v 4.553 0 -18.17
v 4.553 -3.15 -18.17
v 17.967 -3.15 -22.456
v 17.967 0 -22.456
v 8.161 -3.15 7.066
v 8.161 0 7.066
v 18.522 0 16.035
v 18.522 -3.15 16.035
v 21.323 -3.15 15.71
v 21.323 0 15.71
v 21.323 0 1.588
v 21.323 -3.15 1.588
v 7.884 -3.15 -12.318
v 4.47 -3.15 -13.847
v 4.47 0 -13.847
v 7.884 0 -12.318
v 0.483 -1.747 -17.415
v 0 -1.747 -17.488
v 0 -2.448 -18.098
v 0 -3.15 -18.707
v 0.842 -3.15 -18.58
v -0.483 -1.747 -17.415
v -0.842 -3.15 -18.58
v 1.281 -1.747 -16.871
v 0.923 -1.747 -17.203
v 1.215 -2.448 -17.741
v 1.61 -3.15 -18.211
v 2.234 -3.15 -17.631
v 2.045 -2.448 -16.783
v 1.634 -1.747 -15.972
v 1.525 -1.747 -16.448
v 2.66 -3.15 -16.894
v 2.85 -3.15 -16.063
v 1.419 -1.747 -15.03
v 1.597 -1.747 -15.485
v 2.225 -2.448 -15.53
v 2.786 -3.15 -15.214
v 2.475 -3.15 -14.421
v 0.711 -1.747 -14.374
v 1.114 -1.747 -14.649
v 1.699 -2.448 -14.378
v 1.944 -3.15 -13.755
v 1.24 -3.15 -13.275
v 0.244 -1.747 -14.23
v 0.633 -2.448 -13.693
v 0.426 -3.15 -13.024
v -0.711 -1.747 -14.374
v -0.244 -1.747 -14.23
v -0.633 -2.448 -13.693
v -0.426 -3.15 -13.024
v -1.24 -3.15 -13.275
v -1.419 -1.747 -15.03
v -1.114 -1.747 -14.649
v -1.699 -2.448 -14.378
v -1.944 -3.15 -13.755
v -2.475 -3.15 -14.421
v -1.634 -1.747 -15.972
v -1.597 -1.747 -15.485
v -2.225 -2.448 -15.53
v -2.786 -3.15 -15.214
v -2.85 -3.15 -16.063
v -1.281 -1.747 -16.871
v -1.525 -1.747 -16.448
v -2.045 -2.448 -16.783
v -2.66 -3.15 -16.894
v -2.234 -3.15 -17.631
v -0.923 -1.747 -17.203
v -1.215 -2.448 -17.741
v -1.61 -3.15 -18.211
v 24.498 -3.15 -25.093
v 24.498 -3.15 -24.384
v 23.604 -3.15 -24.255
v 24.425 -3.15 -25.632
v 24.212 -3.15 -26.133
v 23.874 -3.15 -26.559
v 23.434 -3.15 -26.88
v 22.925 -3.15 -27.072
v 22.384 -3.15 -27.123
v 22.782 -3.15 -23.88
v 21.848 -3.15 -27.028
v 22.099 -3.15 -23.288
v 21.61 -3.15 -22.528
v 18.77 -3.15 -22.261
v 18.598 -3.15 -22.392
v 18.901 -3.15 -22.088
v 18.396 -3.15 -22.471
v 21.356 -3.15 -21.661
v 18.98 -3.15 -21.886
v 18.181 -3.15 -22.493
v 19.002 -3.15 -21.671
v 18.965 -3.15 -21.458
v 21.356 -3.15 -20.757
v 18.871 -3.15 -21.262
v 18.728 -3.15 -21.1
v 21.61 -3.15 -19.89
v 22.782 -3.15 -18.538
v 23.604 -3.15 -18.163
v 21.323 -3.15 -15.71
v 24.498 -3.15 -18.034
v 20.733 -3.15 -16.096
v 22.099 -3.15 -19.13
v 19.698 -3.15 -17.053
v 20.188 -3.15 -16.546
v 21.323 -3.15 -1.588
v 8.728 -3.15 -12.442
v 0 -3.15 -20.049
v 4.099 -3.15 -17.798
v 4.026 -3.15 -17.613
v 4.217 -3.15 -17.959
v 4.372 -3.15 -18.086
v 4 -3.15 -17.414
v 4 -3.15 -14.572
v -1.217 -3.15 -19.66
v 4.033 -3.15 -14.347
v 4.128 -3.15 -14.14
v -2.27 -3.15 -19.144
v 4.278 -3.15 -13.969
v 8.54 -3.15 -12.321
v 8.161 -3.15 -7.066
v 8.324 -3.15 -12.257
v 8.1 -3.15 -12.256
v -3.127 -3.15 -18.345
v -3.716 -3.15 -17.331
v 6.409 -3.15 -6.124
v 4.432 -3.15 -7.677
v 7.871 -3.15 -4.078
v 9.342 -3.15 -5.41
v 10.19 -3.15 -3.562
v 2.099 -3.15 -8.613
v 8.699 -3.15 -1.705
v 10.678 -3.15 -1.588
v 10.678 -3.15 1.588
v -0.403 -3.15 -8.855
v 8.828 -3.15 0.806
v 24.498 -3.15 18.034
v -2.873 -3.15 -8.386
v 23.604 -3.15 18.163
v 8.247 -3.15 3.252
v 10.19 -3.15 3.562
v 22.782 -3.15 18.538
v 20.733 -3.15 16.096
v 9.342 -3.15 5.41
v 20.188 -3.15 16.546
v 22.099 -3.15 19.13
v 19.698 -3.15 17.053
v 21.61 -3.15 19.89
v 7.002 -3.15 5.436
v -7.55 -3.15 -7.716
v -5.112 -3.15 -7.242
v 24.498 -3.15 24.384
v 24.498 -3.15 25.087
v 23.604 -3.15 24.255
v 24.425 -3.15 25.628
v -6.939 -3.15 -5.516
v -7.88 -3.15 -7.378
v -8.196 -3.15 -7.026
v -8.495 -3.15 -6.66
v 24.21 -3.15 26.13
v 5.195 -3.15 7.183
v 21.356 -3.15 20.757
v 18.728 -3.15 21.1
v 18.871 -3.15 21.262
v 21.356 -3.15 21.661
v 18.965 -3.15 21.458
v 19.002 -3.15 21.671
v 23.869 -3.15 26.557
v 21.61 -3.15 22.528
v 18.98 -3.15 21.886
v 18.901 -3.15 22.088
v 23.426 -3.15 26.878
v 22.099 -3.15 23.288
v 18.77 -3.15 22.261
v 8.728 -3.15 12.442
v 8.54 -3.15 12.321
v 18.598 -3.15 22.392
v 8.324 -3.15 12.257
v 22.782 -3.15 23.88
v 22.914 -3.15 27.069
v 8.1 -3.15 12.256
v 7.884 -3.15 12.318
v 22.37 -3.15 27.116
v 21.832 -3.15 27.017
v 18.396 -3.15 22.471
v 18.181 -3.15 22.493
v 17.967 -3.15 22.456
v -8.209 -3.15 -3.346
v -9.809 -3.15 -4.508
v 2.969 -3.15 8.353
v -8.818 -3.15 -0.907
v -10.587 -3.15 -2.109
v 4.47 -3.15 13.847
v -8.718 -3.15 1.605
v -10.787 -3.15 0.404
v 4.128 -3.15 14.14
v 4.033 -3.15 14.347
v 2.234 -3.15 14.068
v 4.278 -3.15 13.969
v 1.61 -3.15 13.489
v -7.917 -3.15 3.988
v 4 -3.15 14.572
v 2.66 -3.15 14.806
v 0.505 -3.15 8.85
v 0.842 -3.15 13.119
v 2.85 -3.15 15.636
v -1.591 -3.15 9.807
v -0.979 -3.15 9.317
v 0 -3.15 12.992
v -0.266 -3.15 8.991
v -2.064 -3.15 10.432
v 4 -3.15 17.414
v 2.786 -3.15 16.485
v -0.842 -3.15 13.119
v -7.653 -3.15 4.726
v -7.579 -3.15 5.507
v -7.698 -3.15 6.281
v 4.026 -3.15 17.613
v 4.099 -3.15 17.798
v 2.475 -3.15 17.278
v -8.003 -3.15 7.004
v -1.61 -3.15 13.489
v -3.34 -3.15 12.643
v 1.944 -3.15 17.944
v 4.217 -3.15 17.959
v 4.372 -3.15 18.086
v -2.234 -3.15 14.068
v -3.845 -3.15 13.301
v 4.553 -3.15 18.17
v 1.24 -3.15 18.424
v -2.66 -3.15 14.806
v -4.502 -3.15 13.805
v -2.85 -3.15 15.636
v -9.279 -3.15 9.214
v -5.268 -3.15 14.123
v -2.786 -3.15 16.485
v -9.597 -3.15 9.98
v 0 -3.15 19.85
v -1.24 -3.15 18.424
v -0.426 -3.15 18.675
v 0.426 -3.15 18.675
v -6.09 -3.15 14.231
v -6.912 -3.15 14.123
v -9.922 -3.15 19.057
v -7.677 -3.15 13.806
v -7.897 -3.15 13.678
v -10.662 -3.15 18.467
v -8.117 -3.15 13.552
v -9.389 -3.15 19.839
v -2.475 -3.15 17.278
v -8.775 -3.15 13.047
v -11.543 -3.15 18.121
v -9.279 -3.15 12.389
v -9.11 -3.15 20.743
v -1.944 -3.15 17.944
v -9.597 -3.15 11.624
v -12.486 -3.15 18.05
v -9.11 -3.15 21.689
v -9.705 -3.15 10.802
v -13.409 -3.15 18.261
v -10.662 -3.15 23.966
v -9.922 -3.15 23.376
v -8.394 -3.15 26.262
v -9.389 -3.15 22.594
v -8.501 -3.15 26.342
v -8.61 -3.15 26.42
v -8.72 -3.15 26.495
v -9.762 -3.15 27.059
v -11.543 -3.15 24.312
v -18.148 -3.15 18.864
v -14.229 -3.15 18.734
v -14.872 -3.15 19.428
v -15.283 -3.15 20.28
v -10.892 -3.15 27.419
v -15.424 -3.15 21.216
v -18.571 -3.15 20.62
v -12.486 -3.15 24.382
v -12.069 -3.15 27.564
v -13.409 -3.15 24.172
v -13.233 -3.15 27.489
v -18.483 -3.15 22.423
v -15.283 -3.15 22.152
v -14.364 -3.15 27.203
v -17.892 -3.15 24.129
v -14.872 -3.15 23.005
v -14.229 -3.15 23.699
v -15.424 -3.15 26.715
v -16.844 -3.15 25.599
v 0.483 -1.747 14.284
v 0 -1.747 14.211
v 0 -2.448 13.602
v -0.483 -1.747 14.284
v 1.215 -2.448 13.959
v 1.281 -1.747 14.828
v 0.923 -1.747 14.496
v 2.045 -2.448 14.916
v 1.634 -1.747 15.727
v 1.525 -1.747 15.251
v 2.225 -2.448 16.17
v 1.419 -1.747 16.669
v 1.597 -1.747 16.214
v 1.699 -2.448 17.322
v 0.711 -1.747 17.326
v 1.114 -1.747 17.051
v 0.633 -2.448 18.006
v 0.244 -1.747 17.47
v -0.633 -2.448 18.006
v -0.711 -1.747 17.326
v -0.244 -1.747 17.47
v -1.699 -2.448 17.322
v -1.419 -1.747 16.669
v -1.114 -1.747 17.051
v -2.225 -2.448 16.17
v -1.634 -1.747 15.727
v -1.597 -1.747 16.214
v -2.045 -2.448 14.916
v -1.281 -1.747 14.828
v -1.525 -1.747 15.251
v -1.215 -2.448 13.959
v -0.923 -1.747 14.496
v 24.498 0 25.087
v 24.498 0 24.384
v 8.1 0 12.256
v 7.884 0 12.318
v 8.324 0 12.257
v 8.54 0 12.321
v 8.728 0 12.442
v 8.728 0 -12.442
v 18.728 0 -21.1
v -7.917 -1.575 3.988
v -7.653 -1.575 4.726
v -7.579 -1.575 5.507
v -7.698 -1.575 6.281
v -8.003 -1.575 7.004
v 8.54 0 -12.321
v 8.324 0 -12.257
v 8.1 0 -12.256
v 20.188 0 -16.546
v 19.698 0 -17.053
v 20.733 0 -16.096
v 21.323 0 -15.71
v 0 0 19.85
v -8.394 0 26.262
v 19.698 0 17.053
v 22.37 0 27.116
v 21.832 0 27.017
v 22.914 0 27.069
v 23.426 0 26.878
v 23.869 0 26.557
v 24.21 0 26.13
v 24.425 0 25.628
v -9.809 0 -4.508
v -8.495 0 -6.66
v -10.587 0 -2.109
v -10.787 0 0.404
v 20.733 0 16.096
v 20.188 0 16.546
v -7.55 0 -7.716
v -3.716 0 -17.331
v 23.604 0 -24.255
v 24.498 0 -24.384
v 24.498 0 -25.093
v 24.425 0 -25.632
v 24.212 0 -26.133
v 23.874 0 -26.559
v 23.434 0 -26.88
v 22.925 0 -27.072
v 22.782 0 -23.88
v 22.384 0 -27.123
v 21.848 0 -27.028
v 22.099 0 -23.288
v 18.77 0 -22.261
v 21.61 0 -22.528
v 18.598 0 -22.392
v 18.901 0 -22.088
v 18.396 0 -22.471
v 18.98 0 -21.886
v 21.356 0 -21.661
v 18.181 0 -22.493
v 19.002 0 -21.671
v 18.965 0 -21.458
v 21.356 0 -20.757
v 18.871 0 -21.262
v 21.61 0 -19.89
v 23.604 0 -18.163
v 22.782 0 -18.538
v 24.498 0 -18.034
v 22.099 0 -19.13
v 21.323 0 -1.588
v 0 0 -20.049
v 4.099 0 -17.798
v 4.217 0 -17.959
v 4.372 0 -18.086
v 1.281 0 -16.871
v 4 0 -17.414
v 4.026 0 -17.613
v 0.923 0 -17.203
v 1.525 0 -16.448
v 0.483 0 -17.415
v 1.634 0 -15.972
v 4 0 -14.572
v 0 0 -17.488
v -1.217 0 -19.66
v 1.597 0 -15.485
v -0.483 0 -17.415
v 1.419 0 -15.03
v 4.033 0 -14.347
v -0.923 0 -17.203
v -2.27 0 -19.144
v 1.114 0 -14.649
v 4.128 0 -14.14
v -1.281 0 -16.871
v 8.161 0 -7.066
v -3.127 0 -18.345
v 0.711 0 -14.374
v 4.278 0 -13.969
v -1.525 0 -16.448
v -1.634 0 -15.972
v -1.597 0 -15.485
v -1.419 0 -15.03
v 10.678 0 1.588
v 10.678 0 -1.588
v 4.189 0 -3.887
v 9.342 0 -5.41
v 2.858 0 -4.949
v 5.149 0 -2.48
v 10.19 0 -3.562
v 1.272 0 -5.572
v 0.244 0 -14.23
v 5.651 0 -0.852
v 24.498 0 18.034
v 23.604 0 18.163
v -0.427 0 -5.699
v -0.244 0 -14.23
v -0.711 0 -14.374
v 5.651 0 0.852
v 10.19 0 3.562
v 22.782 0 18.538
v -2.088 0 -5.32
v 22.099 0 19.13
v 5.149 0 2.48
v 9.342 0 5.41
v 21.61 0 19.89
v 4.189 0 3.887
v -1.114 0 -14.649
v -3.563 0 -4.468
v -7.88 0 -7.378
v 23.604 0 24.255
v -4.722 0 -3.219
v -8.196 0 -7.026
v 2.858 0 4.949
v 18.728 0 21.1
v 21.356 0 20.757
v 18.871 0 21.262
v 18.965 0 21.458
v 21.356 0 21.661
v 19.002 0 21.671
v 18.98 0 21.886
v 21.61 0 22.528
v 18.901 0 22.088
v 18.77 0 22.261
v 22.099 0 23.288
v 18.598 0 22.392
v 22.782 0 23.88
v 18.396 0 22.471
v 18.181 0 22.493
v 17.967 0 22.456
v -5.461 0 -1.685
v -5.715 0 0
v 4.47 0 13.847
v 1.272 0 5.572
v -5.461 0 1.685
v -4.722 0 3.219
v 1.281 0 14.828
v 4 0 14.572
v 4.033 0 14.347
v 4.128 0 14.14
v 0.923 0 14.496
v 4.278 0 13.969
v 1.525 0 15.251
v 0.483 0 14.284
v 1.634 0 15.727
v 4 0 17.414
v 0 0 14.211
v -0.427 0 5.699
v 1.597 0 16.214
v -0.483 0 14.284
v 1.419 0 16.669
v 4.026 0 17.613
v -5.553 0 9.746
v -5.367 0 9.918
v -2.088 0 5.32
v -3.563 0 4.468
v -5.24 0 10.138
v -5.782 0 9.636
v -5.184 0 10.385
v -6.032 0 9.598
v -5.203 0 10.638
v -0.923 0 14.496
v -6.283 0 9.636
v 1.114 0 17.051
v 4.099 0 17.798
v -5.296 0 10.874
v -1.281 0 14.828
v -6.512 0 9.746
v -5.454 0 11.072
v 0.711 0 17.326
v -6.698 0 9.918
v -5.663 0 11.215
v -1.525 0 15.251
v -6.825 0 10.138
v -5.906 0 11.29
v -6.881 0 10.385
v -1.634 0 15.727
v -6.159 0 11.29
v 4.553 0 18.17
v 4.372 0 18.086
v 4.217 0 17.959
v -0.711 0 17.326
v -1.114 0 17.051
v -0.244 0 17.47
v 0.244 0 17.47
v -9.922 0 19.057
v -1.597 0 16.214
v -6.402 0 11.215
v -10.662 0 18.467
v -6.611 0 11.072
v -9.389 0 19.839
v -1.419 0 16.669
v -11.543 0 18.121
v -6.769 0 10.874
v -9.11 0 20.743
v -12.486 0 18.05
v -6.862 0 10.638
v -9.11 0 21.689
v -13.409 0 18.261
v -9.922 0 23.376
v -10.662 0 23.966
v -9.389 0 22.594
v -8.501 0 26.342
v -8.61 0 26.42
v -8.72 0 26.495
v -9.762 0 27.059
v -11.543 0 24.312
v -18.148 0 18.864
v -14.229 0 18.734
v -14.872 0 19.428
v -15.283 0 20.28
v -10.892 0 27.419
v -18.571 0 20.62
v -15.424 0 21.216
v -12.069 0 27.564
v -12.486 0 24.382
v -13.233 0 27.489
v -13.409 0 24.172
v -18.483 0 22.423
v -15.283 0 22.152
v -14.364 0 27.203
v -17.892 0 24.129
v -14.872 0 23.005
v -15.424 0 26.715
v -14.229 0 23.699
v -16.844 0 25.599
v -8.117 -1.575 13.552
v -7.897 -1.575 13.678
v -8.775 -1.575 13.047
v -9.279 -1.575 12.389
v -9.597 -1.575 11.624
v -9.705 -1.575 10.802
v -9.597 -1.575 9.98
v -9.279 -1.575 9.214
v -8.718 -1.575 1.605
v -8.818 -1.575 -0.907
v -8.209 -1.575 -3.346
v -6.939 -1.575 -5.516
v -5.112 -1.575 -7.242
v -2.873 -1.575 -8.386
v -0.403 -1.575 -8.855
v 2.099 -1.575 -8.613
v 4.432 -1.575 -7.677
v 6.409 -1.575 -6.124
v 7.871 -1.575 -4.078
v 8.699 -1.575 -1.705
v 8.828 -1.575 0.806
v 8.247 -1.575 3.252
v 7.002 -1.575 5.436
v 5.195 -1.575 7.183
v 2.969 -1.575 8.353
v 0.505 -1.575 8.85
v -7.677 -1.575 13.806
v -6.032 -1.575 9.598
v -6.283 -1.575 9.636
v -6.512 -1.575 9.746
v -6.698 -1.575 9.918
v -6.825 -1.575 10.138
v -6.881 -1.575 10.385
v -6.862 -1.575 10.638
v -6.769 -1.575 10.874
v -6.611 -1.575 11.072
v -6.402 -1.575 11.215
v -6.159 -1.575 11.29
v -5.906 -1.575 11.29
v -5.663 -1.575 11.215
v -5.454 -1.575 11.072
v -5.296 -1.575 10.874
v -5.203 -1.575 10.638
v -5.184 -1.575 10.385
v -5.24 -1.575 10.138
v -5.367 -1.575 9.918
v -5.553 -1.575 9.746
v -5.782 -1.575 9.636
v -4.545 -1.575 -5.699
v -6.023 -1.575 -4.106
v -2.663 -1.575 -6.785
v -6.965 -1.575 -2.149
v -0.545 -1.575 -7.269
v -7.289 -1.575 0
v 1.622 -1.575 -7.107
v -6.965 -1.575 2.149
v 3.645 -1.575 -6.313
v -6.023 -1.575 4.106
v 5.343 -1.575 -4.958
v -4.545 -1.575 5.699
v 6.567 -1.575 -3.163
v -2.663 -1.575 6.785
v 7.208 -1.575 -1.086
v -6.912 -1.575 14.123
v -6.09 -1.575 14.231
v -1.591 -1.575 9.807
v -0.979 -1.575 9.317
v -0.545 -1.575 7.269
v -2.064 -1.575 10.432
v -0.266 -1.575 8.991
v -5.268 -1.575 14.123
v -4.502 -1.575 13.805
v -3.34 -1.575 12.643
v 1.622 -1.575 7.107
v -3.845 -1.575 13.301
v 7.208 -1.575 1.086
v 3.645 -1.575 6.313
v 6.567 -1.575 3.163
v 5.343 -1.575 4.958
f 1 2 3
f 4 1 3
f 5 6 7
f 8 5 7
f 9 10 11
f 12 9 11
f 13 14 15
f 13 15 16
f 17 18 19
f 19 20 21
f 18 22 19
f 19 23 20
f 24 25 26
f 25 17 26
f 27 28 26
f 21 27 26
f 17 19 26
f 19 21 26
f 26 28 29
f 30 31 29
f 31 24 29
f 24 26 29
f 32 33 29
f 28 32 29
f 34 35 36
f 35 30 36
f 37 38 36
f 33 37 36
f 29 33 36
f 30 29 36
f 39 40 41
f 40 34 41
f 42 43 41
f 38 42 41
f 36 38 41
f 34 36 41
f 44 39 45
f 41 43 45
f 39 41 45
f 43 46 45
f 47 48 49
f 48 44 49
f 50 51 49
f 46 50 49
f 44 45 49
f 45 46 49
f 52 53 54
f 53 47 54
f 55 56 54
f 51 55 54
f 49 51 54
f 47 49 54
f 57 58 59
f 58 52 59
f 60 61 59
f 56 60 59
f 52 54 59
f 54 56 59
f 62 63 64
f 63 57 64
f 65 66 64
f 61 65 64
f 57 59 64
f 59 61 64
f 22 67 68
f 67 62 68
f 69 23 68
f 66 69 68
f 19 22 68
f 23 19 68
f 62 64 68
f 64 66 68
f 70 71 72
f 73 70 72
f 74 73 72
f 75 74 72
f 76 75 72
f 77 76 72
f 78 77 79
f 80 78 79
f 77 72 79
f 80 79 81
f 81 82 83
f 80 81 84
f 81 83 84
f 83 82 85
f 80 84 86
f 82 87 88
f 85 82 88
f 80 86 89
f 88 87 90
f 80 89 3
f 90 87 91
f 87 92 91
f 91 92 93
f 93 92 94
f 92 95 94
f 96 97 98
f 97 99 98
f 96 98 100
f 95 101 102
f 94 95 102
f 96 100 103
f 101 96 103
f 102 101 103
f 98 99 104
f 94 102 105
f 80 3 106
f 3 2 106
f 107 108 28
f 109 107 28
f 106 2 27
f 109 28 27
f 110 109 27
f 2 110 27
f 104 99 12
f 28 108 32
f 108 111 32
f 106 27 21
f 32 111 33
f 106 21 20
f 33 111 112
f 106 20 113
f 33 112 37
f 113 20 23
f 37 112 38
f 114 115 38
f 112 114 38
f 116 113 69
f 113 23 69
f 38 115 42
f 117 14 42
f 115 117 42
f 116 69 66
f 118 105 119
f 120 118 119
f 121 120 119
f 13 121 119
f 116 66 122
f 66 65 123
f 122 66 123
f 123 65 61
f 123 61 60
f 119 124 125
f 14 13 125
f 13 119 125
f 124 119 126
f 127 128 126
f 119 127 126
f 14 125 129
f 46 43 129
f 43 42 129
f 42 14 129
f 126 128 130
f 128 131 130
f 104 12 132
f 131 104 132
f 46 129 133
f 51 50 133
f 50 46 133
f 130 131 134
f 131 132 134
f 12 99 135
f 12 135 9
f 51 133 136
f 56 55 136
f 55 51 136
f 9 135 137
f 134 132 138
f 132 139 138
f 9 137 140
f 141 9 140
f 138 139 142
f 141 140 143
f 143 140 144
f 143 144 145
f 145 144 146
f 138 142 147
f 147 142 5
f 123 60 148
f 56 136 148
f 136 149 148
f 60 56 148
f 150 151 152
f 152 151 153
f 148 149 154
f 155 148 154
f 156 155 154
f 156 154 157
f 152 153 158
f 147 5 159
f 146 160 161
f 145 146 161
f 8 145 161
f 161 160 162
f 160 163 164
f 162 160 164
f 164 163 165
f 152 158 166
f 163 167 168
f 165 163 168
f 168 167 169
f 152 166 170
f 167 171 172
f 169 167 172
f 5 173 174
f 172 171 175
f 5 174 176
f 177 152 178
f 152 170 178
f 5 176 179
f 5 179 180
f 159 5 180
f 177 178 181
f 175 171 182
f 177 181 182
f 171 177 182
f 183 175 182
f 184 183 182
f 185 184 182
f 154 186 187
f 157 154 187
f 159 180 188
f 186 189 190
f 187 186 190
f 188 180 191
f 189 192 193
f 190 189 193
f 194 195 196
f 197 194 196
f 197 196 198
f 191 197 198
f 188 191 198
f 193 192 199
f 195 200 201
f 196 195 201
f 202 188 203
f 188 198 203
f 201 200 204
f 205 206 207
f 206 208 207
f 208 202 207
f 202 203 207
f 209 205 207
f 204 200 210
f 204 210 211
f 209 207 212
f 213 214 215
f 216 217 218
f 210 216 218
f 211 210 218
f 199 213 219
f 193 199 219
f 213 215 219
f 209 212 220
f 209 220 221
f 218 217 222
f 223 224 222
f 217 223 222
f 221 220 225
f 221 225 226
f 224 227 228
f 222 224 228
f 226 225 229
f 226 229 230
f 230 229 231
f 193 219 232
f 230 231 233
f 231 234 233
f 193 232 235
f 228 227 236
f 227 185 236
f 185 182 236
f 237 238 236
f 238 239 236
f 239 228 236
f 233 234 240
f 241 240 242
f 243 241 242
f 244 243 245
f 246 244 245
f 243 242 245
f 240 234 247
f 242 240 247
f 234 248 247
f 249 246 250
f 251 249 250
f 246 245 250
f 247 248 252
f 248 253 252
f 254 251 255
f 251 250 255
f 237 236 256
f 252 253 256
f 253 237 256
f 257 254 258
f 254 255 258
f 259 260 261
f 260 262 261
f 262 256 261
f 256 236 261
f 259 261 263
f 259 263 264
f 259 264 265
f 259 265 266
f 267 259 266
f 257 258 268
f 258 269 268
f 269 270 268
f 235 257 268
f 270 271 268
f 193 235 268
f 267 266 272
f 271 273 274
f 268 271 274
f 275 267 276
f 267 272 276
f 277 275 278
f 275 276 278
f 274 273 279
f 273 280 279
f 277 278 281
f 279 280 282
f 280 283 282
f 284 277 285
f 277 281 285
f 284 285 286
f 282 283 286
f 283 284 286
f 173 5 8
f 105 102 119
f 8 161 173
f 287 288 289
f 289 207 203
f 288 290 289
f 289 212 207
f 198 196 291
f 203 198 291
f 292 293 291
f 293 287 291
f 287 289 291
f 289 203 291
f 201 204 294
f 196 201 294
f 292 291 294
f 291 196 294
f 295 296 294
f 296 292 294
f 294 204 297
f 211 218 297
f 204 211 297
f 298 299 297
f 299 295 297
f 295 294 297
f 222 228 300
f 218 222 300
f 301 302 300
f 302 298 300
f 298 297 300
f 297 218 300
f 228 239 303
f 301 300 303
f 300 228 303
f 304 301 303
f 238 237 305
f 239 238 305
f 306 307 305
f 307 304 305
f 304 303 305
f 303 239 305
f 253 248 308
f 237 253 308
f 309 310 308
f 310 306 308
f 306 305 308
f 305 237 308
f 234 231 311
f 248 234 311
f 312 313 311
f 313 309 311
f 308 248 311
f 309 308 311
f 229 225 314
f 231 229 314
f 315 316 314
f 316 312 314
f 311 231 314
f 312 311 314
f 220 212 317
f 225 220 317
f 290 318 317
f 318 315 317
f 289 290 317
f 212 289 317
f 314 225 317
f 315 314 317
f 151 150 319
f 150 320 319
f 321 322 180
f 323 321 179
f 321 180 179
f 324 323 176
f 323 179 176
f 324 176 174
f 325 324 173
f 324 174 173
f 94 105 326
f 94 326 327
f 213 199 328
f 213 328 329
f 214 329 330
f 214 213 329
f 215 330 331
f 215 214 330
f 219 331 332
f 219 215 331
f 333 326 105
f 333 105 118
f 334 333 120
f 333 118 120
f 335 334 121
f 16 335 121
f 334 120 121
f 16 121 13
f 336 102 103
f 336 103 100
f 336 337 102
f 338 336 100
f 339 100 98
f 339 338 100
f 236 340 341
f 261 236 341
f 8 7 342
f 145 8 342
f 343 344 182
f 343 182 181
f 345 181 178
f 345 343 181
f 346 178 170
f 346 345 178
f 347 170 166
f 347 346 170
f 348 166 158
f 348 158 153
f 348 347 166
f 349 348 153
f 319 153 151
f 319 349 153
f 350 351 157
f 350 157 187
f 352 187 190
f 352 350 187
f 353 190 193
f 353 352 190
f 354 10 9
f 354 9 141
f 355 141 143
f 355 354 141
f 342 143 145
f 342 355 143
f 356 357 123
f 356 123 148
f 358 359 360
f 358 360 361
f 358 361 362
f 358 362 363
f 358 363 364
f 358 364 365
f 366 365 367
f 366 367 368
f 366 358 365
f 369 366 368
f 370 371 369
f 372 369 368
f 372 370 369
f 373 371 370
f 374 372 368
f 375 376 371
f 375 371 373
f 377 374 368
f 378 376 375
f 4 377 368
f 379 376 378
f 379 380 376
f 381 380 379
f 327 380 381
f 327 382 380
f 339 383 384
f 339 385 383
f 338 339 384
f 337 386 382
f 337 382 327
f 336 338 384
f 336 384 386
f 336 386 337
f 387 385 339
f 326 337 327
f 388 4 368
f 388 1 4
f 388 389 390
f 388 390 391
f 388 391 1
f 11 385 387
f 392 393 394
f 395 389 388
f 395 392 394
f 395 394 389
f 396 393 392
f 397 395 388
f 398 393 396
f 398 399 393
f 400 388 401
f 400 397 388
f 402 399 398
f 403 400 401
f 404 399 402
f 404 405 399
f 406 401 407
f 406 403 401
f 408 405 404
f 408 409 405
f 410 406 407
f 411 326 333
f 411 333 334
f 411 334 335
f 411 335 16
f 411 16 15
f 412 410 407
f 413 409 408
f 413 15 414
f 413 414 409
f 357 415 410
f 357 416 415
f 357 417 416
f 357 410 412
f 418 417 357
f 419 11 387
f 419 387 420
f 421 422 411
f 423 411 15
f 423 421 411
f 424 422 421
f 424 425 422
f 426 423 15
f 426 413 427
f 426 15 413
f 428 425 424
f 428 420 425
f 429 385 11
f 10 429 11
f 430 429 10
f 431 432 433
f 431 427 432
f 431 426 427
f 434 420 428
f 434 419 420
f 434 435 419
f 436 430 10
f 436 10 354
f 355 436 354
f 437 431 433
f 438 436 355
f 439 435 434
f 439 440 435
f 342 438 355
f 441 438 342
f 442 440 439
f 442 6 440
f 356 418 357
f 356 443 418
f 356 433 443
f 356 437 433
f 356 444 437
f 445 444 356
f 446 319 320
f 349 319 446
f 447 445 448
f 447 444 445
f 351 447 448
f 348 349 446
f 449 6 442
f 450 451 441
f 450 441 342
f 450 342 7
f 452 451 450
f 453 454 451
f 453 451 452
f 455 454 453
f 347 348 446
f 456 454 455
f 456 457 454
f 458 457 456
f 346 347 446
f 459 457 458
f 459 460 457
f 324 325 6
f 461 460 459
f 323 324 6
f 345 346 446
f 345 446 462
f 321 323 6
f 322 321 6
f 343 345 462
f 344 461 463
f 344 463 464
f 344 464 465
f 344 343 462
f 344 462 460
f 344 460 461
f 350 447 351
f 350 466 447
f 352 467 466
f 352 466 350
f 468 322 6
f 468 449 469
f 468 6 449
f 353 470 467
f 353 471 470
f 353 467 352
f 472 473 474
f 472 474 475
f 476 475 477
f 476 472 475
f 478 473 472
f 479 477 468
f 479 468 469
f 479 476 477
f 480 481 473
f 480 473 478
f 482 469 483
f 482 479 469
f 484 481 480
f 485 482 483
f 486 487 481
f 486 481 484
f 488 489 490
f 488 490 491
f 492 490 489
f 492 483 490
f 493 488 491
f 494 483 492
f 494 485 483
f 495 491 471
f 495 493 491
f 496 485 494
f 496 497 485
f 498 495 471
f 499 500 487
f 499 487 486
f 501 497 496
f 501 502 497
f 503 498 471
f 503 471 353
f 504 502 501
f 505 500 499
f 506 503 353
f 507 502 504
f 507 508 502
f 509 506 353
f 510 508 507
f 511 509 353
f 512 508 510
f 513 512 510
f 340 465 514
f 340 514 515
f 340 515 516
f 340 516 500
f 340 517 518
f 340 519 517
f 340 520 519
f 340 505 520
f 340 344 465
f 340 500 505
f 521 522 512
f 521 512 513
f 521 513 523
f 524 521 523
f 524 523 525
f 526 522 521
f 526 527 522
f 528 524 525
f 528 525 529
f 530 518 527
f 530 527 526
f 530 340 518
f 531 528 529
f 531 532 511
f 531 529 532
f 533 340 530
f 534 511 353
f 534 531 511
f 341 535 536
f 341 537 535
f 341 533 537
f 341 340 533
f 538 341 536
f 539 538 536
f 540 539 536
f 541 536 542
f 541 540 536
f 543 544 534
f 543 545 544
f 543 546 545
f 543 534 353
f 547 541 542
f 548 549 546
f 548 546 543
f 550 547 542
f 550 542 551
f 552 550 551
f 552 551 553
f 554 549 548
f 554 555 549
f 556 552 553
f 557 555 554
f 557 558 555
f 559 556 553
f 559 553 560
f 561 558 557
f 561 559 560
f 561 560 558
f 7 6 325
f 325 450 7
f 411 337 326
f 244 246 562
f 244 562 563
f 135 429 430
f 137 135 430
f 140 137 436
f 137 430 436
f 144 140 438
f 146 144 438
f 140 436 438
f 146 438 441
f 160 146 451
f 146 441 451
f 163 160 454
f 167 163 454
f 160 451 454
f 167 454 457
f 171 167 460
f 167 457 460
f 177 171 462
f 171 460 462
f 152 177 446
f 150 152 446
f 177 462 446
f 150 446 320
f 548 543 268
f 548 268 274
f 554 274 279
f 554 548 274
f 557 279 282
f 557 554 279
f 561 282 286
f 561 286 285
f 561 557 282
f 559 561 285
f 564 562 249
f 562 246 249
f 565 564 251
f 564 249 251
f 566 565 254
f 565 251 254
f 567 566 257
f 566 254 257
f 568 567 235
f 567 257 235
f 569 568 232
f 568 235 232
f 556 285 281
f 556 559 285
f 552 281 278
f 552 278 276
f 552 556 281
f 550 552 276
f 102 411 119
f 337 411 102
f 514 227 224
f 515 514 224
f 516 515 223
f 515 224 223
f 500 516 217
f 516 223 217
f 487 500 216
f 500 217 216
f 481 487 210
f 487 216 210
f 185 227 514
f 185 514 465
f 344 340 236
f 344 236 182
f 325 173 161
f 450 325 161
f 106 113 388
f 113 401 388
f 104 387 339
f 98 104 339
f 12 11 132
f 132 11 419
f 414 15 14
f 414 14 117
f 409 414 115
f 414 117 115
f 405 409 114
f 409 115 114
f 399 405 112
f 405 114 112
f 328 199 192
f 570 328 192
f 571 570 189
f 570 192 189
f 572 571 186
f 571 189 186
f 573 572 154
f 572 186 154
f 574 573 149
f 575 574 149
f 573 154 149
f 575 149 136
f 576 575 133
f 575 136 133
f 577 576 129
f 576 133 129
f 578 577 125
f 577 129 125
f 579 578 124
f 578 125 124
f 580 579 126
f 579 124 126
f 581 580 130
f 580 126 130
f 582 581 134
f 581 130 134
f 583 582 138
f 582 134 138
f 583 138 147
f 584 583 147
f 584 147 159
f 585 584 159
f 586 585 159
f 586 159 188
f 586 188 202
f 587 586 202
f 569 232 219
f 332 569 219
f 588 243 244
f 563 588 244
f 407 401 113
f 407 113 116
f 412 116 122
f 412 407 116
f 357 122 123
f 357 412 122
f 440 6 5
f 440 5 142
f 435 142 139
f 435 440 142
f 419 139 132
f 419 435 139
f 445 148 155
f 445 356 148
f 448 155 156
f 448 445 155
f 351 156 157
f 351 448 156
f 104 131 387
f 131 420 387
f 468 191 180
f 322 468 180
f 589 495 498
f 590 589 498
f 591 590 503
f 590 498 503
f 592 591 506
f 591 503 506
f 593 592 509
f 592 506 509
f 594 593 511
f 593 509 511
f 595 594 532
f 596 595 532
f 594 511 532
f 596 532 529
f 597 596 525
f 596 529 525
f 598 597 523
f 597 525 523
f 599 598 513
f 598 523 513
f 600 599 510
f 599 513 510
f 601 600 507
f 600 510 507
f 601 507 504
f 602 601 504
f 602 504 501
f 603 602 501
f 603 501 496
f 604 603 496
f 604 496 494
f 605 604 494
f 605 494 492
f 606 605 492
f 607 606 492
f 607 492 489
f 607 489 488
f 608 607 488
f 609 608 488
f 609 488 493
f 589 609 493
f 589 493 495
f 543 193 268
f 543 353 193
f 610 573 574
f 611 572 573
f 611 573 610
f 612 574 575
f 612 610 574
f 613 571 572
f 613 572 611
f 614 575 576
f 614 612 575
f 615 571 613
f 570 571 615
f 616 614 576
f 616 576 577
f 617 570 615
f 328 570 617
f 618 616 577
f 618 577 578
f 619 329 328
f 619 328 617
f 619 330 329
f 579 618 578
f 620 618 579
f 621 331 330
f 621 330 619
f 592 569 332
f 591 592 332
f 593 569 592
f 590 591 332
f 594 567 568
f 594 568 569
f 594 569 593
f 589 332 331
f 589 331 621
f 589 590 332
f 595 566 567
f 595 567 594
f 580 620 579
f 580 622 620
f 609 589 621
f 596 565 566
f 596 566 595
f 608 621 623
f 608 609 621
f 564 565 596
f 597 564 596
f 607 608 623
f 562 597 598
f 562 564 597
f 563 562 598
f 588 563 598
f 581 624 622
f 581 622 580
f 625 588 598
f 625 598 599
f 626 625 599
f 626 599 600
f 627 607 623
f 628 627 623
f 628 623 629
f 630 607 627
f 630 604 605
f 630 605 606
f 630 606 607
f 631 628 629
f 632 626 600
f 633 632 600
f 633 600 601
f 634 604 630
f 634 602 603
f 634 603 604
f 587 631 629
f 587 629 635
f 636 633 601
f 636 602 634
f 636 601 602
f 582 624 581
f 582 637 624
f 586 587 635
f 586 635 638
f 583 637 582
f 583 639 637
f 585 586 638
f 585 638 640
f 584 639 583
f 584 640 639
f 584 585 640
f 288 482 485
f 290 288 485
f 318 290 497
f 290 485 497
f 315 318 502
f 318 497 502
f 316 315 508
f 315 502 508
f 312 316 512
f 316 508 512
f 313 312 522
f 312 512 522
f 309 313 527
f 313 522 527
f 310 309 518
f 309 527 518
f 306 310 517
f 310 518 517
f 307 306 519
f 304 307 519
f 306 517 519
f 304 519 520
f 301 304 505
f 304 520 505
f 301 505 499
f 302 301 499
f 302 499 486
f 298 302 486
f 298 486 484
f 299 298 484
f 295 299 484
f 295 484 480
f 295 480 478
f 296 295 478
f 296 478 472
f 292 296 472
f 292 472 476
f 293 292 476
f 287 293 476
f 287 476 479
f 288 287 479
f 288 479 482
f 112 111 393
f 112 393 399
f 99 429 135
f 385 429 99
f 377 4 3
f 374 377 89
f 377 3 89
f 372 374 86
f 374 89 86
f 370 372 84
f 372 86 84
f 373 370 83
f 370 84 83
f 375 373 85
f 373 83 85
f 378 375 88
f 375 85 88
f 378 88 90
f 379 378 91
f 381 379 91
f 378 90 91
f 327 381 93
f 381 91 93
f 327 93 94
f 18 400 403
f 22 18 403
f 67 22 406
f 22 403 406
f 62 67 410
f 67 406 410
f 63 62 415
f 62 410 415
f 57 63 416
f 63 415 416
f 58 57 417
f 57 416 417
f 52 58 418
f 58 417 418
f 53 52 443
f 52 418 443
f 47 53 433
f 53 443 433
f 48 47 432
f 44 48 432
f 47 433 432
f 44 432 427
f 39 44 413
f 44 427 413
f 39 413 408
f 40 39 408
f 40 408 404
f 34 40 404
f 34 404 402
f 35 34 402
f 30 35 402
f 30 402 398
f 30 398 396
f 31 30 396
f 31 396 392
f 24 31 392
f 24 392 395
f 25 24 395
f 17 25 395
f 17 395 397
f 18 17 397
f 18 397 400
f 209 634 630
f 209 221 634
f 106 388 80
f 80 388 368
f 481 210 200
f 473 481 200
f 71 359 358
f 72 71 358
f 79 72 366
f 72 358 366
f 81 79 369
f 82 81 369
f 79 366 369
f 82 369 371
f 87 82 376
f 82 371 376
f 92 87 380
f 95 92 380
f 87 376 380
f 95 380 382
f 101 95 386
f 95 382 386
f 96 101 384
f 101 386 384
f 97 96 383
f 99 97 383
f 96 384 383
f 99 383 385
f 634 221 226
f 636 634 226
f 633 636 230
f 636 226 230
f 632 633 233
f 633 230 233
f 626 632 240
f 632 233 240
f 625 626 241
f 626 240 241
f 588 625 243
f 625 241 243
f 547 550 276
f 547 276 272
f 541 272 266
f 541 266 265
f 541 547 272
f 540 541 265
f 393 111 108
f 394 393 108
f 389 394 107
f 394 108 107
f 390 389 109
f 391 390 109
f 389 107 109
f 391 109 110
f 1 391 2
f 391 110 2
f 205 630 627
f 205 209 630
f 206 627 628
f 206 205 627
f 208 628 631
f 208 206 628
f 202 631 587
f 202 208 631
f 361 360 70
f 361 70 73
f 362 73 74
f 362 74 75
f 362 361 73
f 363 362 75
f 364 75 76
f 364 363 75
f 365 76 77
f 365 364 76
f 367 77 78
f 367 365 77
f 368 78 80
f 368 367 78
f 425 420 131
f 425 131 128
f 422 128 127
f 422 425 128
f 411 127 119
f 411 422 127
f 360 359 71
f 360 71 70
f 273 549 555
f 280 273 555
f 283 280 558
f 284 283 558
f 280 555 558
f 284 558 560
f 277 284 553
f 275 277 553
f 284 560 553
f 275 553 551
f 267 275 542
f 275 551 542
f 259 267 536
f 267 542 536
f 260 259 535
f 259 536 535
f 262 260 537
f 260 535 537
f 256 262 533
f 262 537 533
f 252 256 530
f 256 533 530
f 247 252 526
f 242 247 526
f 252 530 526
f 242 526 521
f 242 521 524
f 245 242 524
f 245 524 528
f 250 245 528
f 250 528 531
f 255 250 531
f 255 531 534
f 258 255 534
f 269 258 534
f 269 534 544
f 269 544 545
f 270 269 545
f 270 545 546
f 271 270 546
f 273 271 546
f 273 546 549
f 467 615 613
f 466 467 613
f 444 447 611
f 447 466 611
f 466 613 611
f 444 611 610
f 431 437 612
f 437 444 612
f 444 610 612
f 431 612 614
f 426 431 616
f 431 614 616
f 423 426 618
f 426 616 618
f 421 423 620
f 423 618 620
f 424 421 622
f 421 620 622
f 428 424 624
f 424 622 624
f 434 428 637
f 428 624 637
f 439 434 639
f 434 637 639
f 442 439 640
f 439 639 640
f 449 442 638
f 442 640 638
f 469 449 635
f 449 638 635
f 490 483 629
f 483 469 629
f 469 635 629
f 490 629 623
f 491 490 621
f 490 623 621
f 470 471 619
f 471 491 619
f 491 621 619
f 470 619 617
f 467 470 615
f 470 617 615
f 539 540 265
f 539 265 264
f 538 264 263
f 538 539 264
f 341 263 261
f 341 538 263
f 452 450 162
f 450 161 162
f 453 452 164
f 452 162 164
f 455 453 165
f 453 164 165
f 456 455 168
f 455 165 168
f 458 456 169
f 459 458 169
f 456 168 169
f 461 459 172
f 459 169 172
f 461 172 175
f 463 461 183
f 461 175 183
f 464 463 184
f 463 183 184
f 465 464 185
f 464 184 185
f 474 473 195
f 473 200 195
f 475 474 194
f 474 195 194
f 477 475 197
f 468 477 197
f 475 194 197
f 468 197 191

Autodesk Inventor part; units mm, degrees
sketch "Sketch1" plane through (0, 0, 0) normal (0, 1, 0) x (-1, 0, 0)
  circle A0 centre (0, 0) radius 5.715
  circle A1 centre (0, 0) radius 24.4983 construction
  line L0 (38.3553, 0) -> (-43.5095, 0) construction
  line L1 (0, -41.4931) -> (0, 53.8329) construction
  line L2 (-24.4983, 0) -> (-24.4983, -14.859)
  arc A2 (-24.4983, -24.384) -> (-24.4983, -18.034) centre (-24.4983, -21.209) ccw
  arc A3 (-24.4983, 24.384) -> (-24.4983, 18.034) centre (-24.4983, 21.209) ccw construction
  line L3 (-24.4983, 21.209) -> (-24.4983, 18.034) construction
  arc A4 (-24.4983, 14.859) -> (-21.3233, 15.7097) centre (-24.4983, 21.209) ccw construction
  arc A5 (-21.9753, -27.0363) -> (-20.631, -26.2455) centre (-24.4983, -21.209) ccw construction
  line L4 (-24.4983, 14.859) -> (-24.4983, 0)
  line L5 (-24.4983, -14.859) -> (-24.4983, -18.034)
  arc A6 (-22.4188, -15.2092) -> (-24.4983, -27.559) centre (-24.4983, -21.209) ccw construction
  arc A7 (-24.4983, -18.034) -> (-24.4983, -24.384) centre (-24.4983, -21.209) ccw construction
  line L6 (-24.4983, 21.209) -> (-24.4983, 24.384) construction
  arc A8 (-24.4983, 18.034) -> (-24.4983, 24.384) centre (-24.4983, 21.209) ccw
  line L7 (-24.4983, 24.384) -> (-24.4983, 25.0867)
  line L8 (-24.4983, -24.384) -> (-24.4983, -25.0929)
  line L9 (-24.4983, 18.034) -> (-24.4983, 14.859)
  line L10 (-24.4983, -18.034) -> (-24.4983, -24.384) construction
  line L11 (0, 0) -> (-8.1614, 7.0656) construction
  line L12 (0, 0) -> (-8.1614, -7.0656) construction
  line L13 (0, 0) -> (24.493, 0) construction
  arc A9 (9.9646, -4.1519) -> (9.9646, 4.1519) centre (0, 0) ccw construction
  line L14 (-5.7223, -9.1535) -> (-5.719, -9.1507) construction
  line L15 (-9.8786, -4.3527) -> (-22.4188, -15.2092) construction
  line L16 (-21.3233, 15.7097) -> (-21.3233, -15.7097)
  arc A10 (7.4735, -7.7897) -> (9.7402, -4.654) centre (0, 0) ccw construction
  line L17 (-5.719, -9.1507) -> (-18.2625, -20.01) construction
  arc A11 (-18.1902, -21.9377) -> (-18.2625, -20.01) centre (-24.4983, -21.209) ccw construction
  arc A12 (-18.2625, -20.01) -> (-19.6975, -17.0527) centre (-24.4983, -21.209) ccw construction
  line L18 (-8.1614, -7.0656) -> (-19.6975, -17.0527)
  arc A13 (-19.6975, -17.0527) -> (-21.3233, -15.7097) centre (-24.4983, -21.209) ccw
  arc A14 (-8.1614, 7.0656) -> (-8.1614, -7.0656) centre (0, 0) ccw
  line L19 (-19.6975, 17.0527) -> (-24.4983, 21.209) construction
  arc A15 (-21.3233, 15.7097) -> (-19.6975, 17.0527) centre (-24.4983, 21.209) ccw
  arc A16 (-21.3233, -15.7097) -> (-22.4188, -15.2092) centre (-24.4983, -21.209) ccw construction
  line L20 (-8.1614, 7.0656) -> (-18.5216, 16.0348)
  arc A17 (-8.1614, -7.0656) -> (6.5744, -8.562) centre (0, 0) ccw construction
  line L21 (-8.1614, -7.0656) -> (-19.6975, -17.0527) construction
  arc A18 (-21.3233, -15.7097) -> (-24.4983, -14.859) centre (-24.4983, -21.209) ccw construction
  line L22 (-19.6975, -17.0527) -> (-24.4983, -21.209) construction
  arc A19 (-19.6975, -17.0527) -> (-21.3233, -15.7097) centre (-24.4983, -21.209) ccw construction
  line L23 (-18.5216, 16.0348) -> (-19.6975, 17.0527)
  arc A20 (-19.6975, 17.0527) -> (-18.7927, 23.9963) centre (-24.4983, 21.209) ccw construction
  arc A21 (9.9646, 4.1519) -> (8.0122, 7.2344) centre (0, 0) ccw construction
  arc A22 (7.4735, 7.7897) -> (5.3975, 9.3487) centre (0, 0) ccw construction
  line L24 (0, 0) -> (5.3975, 9.3487) construction
  circle A23 centre (12.2491, 21.2162) radius 3.175
  arc A24 (15.4241, 26.7154) -> (12.0688, 27.5636) centre (12.2491, 21.2162) ccw
  arc A25 (17.9787, 18.4785) -> (18.1476, 18.8644) centre (12.2491, 21.2162) ccw construction
  arc A26 (12.0688, 27.5636) -> (8.7197, 26.4949) centre (12.2491, 21.2162) ccw
  arc A27 (-24.4983, -27.559) -> (-22.566, -27.2579) centre (-24.4983, -21.209) ccw construction
  arc A28 (-20.631, -26.2455) -> (-18.1902, -21.9377) centre (-24.4983, -21.209) ccw construction
  arc A29 (-20.631, -26.2455) -> (-19.6975, -17.0527) centre (-24.4983, -21.209) ccw construction
  arc A30 (6.5744, -8.562) -> (7.4735, -7.7897) centre (0, 0) ccw construction
  arc A31 (9.7402, -4.654) -> (9.9646, -4.1519) centre (0, 0) ccw construction
  arc A32 (6.7499, 18.0412) -> (7.1395, 17.446) centre (12.2491, 21.2162) ccw construction
  arc A33 (6.7484, 24.3886) -> (6.7499, 18.0412) centre (12.2491, 21.2162) ccw construction
  arc A34 (-0.7648, 10.7679) -> (-8.1614, 7.0656) centre (0, 0) ccw construction
  arc A35 (-18.7927, 23.9963) -> (-18.999, 24.384) centre (-24.4983, 21.209) ccw construction
  arc A36 (-18.999, 24.384) -> (-21.9753, 27.0363) centre (-24.4983, 21.209) ccw construction
  arc A37 (-21.9753, 27.0363) -> (-22.5177, 27.2422) centre (-24.4983, 21.209) ccw construction
  arc A38 (-24.4987, 27.559) -> (-24.4983, 14.859) centre (-24.4983, 21.209) ccw construction
  arc A39 (0, -11.8491) -> (3.716, -17.3312) centre (0, -15.8496) ccw construction
  circle A40 centre (0, 15.8496) radius 4.0005 construction
  line L25 (3.0165, -19.0856) -> (3.716, -17.3312) construction
  arc A41 (18.1476, 18.8644) -> (15.4241, 26.7154) centre (12.2491, 21.2162) ccw
  line L26 (3.0165, -19.0856) -> (1.2173, -19.6604) construction
  arc A42 (9.0741, 15.7169) -> (11.5389, 14.906) centre (12.2491, 21.2162) ccw construction
  arc A43 (5.3975, 9.3487) -> (2.2591, 10.556) centre (0, 0) ccw construction
  line L27 (9.0741, 15.7169) -> (22.677, 39.2777) construction
  line L28 (5.3975, 9.3487) -> (9.0741, 15.7169) construction
  arc A44 (11.5389, 14.906) -> (17.9787, 18.4785) centre (12.2491, 21.2162) ccw construction
  arc A45 (7.1395, 17.446) -> (9.0741, 15.7169) centre (12.2491, 21.2162) ccw construction
  arc A46 (2.2591, 10.556) -> (1.3866, 10.7056) centre (0, 0) ccw construction
  arc A47 (8.0122, 7.2344) -> (7.4735, 7.7897) centre (0, 0) ccw construction
  arc A48 (8.7197, 26.4949) -> (18.1476, 18.8644) centre (12.2491, 21.2162) ccw construction
  arc A49 (-22.5656, 27.2577) -> (-24.4983, 27.559) centre (-24.4983, 21.209) ccw construction
  arc A50 (-22.566, -27.2579) -> (-20.631, -26.2455) centre (-24.4983, -21.209) ccw construction
  arc A51 (3.716, -17.3312) -> (0, -11.8491) centre (0, -15.8496) ccw construction
  line L29 (0, -20.0493) -> (-21.848, -27.0285)
  arc A52 (1.2173, -19.6604) -> (3.716, -17.3312) centre (0, -15.8496) ccw
  line L30 (0, 19.8501) -> (-21.8325, 27.0173)
  arc A53 (-22.5177, 27.2422) -> (-22.5656, 27.2577) centre (-24.4983, 21.209) ccw construction
  line L31 (0, 19.8501) -> (8.3945, 26.2624)
  arc A54 (8.3945, 26.2624) -> (6.7484, 24.3886) centre (12.2491, 21.2162) ccw construction
  arc A55 (-21.8325, 27.0173) -> (-24.4983, 25.0867) centre (-22.4663, 25.0867) ccw
  arc A56 (-24.4983, -25.0929) -> (-21.848, -27.0285) centre (-22.4663, -25.0929) ccw
  line L32 (-21.8325, 27.0173) -> (-24.4983, 27.8924) construction
  line L33 (-24.4983, 24.384) -> (-24.4983, 27.8924) construction
  line L34 (-21.848, -27.0285) -> (-24.4983, -27.8751) construction
  line L35 (-24.4983, -25.0929) -> (-24.4983, -27.8751) construction
  line L36 (8.3945, 26.2624) -> (26.6603, 40.2149) construction
  line L37 (18.1476, 18.8644) -> (26.6603, 40.2149) construction
  line L38 (1.2173, -19.6604) -> (0, -20.0493)
  line L39 (3.716, -17.3312) -> (18.1476, 18.8644)
  arc A57 (18.1476, 18.8644) -> (8.3945, 26.2624) centre (12.2491, 21.2162) ccw
  dimension "headplate_aperture_diameter" = 11.43
  dimension "mount_diameter" = 48.9966
  dimension "d3" = 6.35
  dimension "d4" = 42.418
  dimension "d5" = 31.6992
  dimension "d7" = 3.175
  dimension "d8" = 3.175
  dimension "d10" = 5.08
  dimension "d11" = 3.175
  dimension "d12" = 3.175
  dimension "d16" = 3.175
  dimension "d33" = 120
  dimension "d34" = 6.35
  dimension "d36" = 3.175
  dimension "d46" = 8.001
  dimension "d75" = 2.032
ref_plane "Work Plane2" through (0, 1.524, 0) normal (0, 1, 0) x (1, 0, 0)
ref_plane "Work Plane4" through (0, 1.524, 0) normal (0, 1, 0) x (1, 0, 0)
extrude "Extrusion6" add sketch "Sketch1" against normal blind 3.1496
sketch "Sketch6" plane through (0, 0, 0) normal (0, 1, 0) x (1, 0, 0)
  point P0 (0, 0)
  point P1 (0, -15.8496)
  point P2 (0, 15.8496)
hole "Hole4" [suppressed]
chamfer "Chamfer2" [suppressed]
sketch "Sketch7" plane through (0, -3.1496, 0) normal (0, -1, 0) x (1, 0, 0)
  point P0 (0, 0)
  point P1 (0, 15.8496)
  point P2 (0, -15.8496)
hole "Hole5" at (0, -3.1496, -15.8496) at (0, -3.1496, 15.8496) direction (0, 1, 0) diameter 3.2766 depth 8.8646 tip angle 118 countersink diameter 5.715 countersink angle 82 clearance for "Flat Head Machine Screw (82)" size "#4" standard "Ansi Unified Screw Threads"
chamfer "Chamfer3" distance 3.1496 angle 45 1 edges at (5.715, -3.1496, 0)
ref_plane "Work Plane5" through (0, -3.1496, 0) normal (0, -1, 0) x (1, 0, 0)
sketch "Sketch8" plane through (0, -3.1496, 0) normal (0, -1, 0) x (1, 0, 0)
  point P0 (0, 0)
  point P1 (0, 0)
  point P2 (0, 0)
hole "Hole6" [suppressed]
sketch "Sketch9" plane through (0, 0, 0) normal (0, 1, 0) x (1, 0, 0)
  arc A0 (8.1614, -7.0656) -> (8.1614, 7.0656) centre (0, 0) ccw projected
  line L0 (19.6975, 17.0527) -> (8.1614, 7.0656) projected
  line L1 (8.1614, -7.0656) -> (19.6975, -17.0527) projected
  line L2 (10.795, 9.3456) -> (10.795, 0)
  line L3 (10.795, 0) -> (10.795, -9.3456)
  line L4 (8.1614, 7.0656) -> (19.6975, 17.0527) projected
  line L5 (10.795, 9.3456) -> (8.1614, 7.0656)
  line L6 (10.795, -9.3456) -> (8.1614, -7.0656)
  line L7 (19.6975, -17.0527) -> (8.1614, -7.0656) projected
  arc A1 (8.1614, -7.0656) -> (8.1614, 7.0656) centre (0, 0) ccw
extrude "Extrusion7" [suppressed]
sketch "Sketch10" plane through (0, 0, 0) normal (0, 1, 0) x (1, 0, 0)
  line L0 (-3.716, 17.3312) -> (-18.1476, -18.8644) projected
  arc A0 (-9.9646, 4.1519) -> (-9.9646, -4.1519) centre (0, 0) ccw construction
  arc A1 (-7.4735, 7.7897) -> (-9.7402, 4.654) centre (0, 0) ccw construction
  line L1 (-18.1476, -18.8644) -> (-3.716, 17.3312) projected
  arc A2 (-8.4953, 6.6604) -> (-10.7874, -0.4044) centre (0, 0) ccw
  line L2 (-10.7874, -0.4044) -> (-7.5498, 7.7157)
  arc A3 (-7.5498, 7.7157) -> (-8.4953, 6.6604) centre (0, 0) ccw
extrude "Extrusion8" add sketch "Sketch10" against normal blind 3.1496
sketch "Sketch11" plane through (0, -3.1496, 0) normal (0, -1, 0) x (1, 0, 0)
  line L0 (24.4983, -18.034) -> (24.4983, 18.034) projected
  arc A0 (24.4983, 24.384) -> (24.4983, 18.034) centre (24.4983, 21.209) ccw projected
  line L1 (24.4983, 24.384) -> (24.4983, 25.0867) projected
  arc A1 (24.4983, 25.0867) -> (21.8325, 27.0173) centre (22.4663, 25.0867) ccw projected
  line L2 (21.8325, 27.0173) -> (0, 19.8501) projected
  line L3 (0, 19.8501) -> (-8.3945, 26.2624) projected
  arc A2 (-8.3945, 26.2624) -> (-18.1476, 18.8644) centre (-12.2491, 21.2162) ccw projected
  line L4 (-18.1476, 18.8644) -> (-10.7874, 0.4044) projected
  arc A3 (-3.716, -17.3312) -> (-1.2173, -19.6604) centre (0, -15.8496) ccw projected
  line L5 (-1.2173, -19.6604) -> (21.848, -27.0285) projected
  arc A4 (21.848, -27.0285) -> (24.4983, -25.0929) centre (22.4663, -25.0929) ccw projected
  line L6 (24.4983, -25.0929) -> (24.4983, -24.384) projected
  arc A5 (24.4983, -18.034) -> (24.4983, -24.384) centre (24.4983, -21.209) ccw projected
  circle A6 centre (-12.2491, 21.2162) radius 3.175 projected
  arc A7 (21.3233, -15.7097) -> (19.6975, -17.0527) centre (24.4983, -21.209) ccw projected
  line L7 (19.6975, -17.0527) -> (8.1614, -7.0656) projected
  line L8 (8.1614, 7.0656) -> (19.6975, 17.0527) projected
  arc A8 (19.6975, 17.0527) -> (21.3233, 15.7097) centre (24.4983, 21.209) ccw projected
  line L9 (21.3233, 15.7097) -> (21.3233, -15.7097) projected
  circle A9 centre (0, 15.8496) radius 2.8575 projected
  circle A10 centre (0, -15.8496) radius 2.8575 projected
  line L10 (4.5527, -18.1705) -> (17.9673, -22.4558)
  line L11 (-1.2173, -19.6604) -> (21.848, -27.0285) projected
  line L12 (8.7283, -12.4421) -> (18.7283, -21.0995)
  line L13 (19.6975, -17.0527) -> (8.1614, -7.0656) projected
  arc A11 (17.9673, -22.4558) -> (18.7283, -21.0995) centre (18.2088, -21.6996) ccw
  line L14 (4.0005, -17.4144) -> (4.0005, -14.5718)
  arc A12 (-3.716, -17.3312) -> (-1.2173, -19.6604) centre (0, -15.8496) ccw projected
  circle A13 centre (0, -15.8496) radius 4.0005 construction
  arc A14 (-6.5744, -8.562) -> (8.1614, -7.0656) centre (0, 0) ccw construction
  line L15 (0, -15.8496) -> (4.0005, -14.0576) construction
  line L16 (4.0005, -14.0576) -> (12.065, -10.4451) construction
  line L17 (4.4698, -13.8474) -> (7.8842, -12.3179)
  arc A15 (4.0005, -17.4144) -> (4.5527, -18.1705) centre (4.7942, -17.4144) ccw
  arc A16 (4.4698, -13.8474) -> (4.0005, -14.5718) centre (4.7942, -14.5718) ccw
  arc A17 (8.7283, -12.4421) -> (7.8842, -12.3179) centre (8.2087, -13.0422) ccw
  line L18 (-30.1541, 0) -> (34.1819, 0) projected
  line L19 (4.5527, 18.1705) -> (17.9673, 22.4558)
  line L20 (8.7283, 12.4421) -> (18.7283, 21.0995)
  arc A18 (18.7283, 21.0995) -> (17.9673, 22.4558) centre (18.2088, 21.6996) ccw
  line L21 (4.0005, 17.4144) -> (4.0005, 14.5718)
  line L22 (4.4698, 13.8474) -> (7.8842, 12.3179)
  arc A19 (4.5527, 18.1705) -> (4.0005, 17.4144) centre (4.7942, 17.4144) ccw
  arc A20 (4.0005, 14.5718) -> (4.4698, 13.8474) centre (4.7942, 14.5718) ccw
  arc A21 (7.8842, 12.3179) -> (8.7283, 12.4421) centre (8.2087, 13.0422) ccw
  arc A22 (8.1614, -7.0656) -> (8.1614, 7.0656) centre (0, 0) ccw projected
  arc A23 (-10.7874, 0.4044) -> (-7.5498, -7.7157) centre (0, 0) ccw projected
  line L23 (-7.5498, -7.7157) -> (-3.716, -17.3312) projected
  point P0 (8.3458, -12.1111)
  point P1 (4.0005, 14.0576)
  dimension "d98" = 3.175
  dimension "d99" = 3.6938
  dimension "d100" = 0.7937
  dimension "d101" = 0.7937
  dimension "d102" = 0.7937
extrude "Extrusion9" cut sketch "Sketch11" against normal blind 3.1496 contours A15 L14 A16 L17 A17 L12 A11 L10 | L19 A18 L20 A21 L22 A20 L21 A19
sketch "Sketch17" plane through (0, -3.1496, 0) normal (0, -1, 0) x (1, 0, 0)
  circle A0 centre (0, 0) radius 8.75 construction
  circle A1 centre (0, 0) radius 9 construction
  dimension "d123" = 18
  dimension "d124" = 17.5
chamfer "Chamfer4" [suppressed]
sketch "Sketch18" plane through (0, -3.1496, 0) normal (0, -1, 0) x (1, 0, 0)
  circle A0 centre (0, 0) radius 8.8646 construction
  circle A1 centre (-12.2491, 21.2162) radius 3.175 projected
  circle A2 centre (-12.2491, 21.2162) radius 3.175 construction
  line L0 (-12.2491, 21.2162) -> (-4.4323, 7.677) construction
  circle A3 centre (0, 0) radius 5.715 construction
  line L1 (-2.8575, 4.9493) -> (0, 0) construction
  line L2 (-4.4323, 7.677) -> (-2.8575, 4.9493) construction
  arc A4 (-7.917, 3.9878) -> (0.505, 8.8502) centre (0, 0) ccw
  line L3 (-9.2794, 9.2143) -> (-8.003, 7.0035)
  line L4 (-8.1172, 13.5515) -> (-7.8973, 13.6785)
  line L5 (-3.3402, 12.6433) -> (-2.0638, 10.4325)
  line L6 (-7.6773, 13.8055) -> (-7.8973, 13.6785)
  arc A5 (-4.4323, 7.677) -> (-7.0569, 5.3649) centre (0, 0) ccw construction
  arc A6 (-1.1177, 8.7939) -> (-4.4323, 7.677) centre (0, 0) ccw construction
  arc A7 (-8.1172, 13.5515) -> (-9.2794, 9.2143) centre (-6.5297, 10.8018) ccw
  arc A8 (-3.3402, 12.6433) -> (-7.6773, 13.8055) centre (-6.0898, 11.0558) ccw
  arc A9 (-2.0638, 10.4325) -> (0.505, 8.8502) centre (0.6859, 12.02) ccw
  arc A10 (-7.917, 3.9878) -> (-8.003, 7.0035) centre (-10.7526, 5.416) ccw
  point P0 (-10.8669, 11.964)
  point P1 (-4.9277, 15.393)
  dimension "d128" = 7.62
  dimension "d129" = 3.429
  dimension "d142" = 3.175
extrude "Extrusion10" cut sketch "Sketch18" against normal blind 1.5748 contours A10 L3 A7 L4 L6 A8 L5 A9 A4
sketch "Sketch19" plane through (0, -1.5748, 0) normal (0, -1, 0) x (1, 0, 0)
  circle A0 centre (0, 0) radius 7.2898 projected
  line L0 (-8.1172, 13.5515) -> (-7.6773, 13.8055) projected
  arc A1 (-8.1172, 13.5515) -> (-9.2794, 9.2143) centre (-6.5297, 10.8018) ccw projected
  line L1 (-8.003, 7.0035) -> (-9.2794, 9.2143) projected
  arc A2 (-7.917, 3.9878) -> (-8.003, 7.0035) centre (-10.7526, 5.416) ccw projected
  arc A3 (-7.917, 3.9878) -> (0.505, 8.8502) centre (0, 0) ccw projected
  arc A4 (-2.0638, 10.4325) -> (0.505, 8.8502) centre (0.6859, 12.02) ccw projected
  line L2 (-3.3402, 12.6433) -> (-2.0638, 10.4325) projected
  arc A5 (-3.3402, 12.6433) -> (-7.6773, 13.8055) centre (-6.0898, 11.0558) ccw projected
  point P0 (-6.0325, 10.4486)
  dimension "d133" = 12.065
  dimension "d134" = 3.429
hole "Hole9" at (-6.0325, -1.5748, 10.4486) direction (0, 1, 0) diameter 1.7018 depth 6.6294 tip angle 118
sketch "Sketch20" plane through (0, 0, 0) normal (0, 1, 0) x (1, 0, 0)
  line L0 (-38.3553, 0) -> (43.5095, 0) construction
  line L1 (23.2205, -1.5875) -> (10.0043, -1.5875)
  line L2 (10.0043, -1.5875) -> (10.0043, 1.5875)
  line L3 (10.0043, 1.5875) -> (23.2205, 1.5875)
  line L4 (23.2205, 1.5875) -> (23.2205, -1.5875)
  line L5 (23.2205, -1.5875) -> (10.0043, 1.5875) construction
  line L6 (10.0043, -1.5875) -> (23.2205, 1.5875) construction
  arc A0 (8.1614, -7.0656) -> (8.1614, 7.0656) centre (0, 0) ccw projected
  line L7 (21.3233, -15.7097) -> (21.3233, 15.7097) projected
  point P0 (16.6124, 0)
  dimension "d143" = 3.175
  dimension "d144" = 1.8972
  dimension "d145" = 13.2162
extrude "Extrusion11" add sketch "Sketch20" against normal blind 3.1496
equation "\"d4\" = bearing_edge_distance"
equation "\"d7\" = ball_bearing_radius"
equation "\"d8\" = ball_bearing_radius"
equation "\"d36\" = d7"
equation "\"bearing_edge_distance\" = 42.418"
equation "\"headplate_thickness\" = 3.1496"
equation "\"center_thread_major_diameter\" = 18"
equation "\"center_thread_minor_diameter\" = 17.5"
equation "\"ball_bearing_radius\" = 3.175"
properties part number "v2_tri_headplate_parameter_REF"
